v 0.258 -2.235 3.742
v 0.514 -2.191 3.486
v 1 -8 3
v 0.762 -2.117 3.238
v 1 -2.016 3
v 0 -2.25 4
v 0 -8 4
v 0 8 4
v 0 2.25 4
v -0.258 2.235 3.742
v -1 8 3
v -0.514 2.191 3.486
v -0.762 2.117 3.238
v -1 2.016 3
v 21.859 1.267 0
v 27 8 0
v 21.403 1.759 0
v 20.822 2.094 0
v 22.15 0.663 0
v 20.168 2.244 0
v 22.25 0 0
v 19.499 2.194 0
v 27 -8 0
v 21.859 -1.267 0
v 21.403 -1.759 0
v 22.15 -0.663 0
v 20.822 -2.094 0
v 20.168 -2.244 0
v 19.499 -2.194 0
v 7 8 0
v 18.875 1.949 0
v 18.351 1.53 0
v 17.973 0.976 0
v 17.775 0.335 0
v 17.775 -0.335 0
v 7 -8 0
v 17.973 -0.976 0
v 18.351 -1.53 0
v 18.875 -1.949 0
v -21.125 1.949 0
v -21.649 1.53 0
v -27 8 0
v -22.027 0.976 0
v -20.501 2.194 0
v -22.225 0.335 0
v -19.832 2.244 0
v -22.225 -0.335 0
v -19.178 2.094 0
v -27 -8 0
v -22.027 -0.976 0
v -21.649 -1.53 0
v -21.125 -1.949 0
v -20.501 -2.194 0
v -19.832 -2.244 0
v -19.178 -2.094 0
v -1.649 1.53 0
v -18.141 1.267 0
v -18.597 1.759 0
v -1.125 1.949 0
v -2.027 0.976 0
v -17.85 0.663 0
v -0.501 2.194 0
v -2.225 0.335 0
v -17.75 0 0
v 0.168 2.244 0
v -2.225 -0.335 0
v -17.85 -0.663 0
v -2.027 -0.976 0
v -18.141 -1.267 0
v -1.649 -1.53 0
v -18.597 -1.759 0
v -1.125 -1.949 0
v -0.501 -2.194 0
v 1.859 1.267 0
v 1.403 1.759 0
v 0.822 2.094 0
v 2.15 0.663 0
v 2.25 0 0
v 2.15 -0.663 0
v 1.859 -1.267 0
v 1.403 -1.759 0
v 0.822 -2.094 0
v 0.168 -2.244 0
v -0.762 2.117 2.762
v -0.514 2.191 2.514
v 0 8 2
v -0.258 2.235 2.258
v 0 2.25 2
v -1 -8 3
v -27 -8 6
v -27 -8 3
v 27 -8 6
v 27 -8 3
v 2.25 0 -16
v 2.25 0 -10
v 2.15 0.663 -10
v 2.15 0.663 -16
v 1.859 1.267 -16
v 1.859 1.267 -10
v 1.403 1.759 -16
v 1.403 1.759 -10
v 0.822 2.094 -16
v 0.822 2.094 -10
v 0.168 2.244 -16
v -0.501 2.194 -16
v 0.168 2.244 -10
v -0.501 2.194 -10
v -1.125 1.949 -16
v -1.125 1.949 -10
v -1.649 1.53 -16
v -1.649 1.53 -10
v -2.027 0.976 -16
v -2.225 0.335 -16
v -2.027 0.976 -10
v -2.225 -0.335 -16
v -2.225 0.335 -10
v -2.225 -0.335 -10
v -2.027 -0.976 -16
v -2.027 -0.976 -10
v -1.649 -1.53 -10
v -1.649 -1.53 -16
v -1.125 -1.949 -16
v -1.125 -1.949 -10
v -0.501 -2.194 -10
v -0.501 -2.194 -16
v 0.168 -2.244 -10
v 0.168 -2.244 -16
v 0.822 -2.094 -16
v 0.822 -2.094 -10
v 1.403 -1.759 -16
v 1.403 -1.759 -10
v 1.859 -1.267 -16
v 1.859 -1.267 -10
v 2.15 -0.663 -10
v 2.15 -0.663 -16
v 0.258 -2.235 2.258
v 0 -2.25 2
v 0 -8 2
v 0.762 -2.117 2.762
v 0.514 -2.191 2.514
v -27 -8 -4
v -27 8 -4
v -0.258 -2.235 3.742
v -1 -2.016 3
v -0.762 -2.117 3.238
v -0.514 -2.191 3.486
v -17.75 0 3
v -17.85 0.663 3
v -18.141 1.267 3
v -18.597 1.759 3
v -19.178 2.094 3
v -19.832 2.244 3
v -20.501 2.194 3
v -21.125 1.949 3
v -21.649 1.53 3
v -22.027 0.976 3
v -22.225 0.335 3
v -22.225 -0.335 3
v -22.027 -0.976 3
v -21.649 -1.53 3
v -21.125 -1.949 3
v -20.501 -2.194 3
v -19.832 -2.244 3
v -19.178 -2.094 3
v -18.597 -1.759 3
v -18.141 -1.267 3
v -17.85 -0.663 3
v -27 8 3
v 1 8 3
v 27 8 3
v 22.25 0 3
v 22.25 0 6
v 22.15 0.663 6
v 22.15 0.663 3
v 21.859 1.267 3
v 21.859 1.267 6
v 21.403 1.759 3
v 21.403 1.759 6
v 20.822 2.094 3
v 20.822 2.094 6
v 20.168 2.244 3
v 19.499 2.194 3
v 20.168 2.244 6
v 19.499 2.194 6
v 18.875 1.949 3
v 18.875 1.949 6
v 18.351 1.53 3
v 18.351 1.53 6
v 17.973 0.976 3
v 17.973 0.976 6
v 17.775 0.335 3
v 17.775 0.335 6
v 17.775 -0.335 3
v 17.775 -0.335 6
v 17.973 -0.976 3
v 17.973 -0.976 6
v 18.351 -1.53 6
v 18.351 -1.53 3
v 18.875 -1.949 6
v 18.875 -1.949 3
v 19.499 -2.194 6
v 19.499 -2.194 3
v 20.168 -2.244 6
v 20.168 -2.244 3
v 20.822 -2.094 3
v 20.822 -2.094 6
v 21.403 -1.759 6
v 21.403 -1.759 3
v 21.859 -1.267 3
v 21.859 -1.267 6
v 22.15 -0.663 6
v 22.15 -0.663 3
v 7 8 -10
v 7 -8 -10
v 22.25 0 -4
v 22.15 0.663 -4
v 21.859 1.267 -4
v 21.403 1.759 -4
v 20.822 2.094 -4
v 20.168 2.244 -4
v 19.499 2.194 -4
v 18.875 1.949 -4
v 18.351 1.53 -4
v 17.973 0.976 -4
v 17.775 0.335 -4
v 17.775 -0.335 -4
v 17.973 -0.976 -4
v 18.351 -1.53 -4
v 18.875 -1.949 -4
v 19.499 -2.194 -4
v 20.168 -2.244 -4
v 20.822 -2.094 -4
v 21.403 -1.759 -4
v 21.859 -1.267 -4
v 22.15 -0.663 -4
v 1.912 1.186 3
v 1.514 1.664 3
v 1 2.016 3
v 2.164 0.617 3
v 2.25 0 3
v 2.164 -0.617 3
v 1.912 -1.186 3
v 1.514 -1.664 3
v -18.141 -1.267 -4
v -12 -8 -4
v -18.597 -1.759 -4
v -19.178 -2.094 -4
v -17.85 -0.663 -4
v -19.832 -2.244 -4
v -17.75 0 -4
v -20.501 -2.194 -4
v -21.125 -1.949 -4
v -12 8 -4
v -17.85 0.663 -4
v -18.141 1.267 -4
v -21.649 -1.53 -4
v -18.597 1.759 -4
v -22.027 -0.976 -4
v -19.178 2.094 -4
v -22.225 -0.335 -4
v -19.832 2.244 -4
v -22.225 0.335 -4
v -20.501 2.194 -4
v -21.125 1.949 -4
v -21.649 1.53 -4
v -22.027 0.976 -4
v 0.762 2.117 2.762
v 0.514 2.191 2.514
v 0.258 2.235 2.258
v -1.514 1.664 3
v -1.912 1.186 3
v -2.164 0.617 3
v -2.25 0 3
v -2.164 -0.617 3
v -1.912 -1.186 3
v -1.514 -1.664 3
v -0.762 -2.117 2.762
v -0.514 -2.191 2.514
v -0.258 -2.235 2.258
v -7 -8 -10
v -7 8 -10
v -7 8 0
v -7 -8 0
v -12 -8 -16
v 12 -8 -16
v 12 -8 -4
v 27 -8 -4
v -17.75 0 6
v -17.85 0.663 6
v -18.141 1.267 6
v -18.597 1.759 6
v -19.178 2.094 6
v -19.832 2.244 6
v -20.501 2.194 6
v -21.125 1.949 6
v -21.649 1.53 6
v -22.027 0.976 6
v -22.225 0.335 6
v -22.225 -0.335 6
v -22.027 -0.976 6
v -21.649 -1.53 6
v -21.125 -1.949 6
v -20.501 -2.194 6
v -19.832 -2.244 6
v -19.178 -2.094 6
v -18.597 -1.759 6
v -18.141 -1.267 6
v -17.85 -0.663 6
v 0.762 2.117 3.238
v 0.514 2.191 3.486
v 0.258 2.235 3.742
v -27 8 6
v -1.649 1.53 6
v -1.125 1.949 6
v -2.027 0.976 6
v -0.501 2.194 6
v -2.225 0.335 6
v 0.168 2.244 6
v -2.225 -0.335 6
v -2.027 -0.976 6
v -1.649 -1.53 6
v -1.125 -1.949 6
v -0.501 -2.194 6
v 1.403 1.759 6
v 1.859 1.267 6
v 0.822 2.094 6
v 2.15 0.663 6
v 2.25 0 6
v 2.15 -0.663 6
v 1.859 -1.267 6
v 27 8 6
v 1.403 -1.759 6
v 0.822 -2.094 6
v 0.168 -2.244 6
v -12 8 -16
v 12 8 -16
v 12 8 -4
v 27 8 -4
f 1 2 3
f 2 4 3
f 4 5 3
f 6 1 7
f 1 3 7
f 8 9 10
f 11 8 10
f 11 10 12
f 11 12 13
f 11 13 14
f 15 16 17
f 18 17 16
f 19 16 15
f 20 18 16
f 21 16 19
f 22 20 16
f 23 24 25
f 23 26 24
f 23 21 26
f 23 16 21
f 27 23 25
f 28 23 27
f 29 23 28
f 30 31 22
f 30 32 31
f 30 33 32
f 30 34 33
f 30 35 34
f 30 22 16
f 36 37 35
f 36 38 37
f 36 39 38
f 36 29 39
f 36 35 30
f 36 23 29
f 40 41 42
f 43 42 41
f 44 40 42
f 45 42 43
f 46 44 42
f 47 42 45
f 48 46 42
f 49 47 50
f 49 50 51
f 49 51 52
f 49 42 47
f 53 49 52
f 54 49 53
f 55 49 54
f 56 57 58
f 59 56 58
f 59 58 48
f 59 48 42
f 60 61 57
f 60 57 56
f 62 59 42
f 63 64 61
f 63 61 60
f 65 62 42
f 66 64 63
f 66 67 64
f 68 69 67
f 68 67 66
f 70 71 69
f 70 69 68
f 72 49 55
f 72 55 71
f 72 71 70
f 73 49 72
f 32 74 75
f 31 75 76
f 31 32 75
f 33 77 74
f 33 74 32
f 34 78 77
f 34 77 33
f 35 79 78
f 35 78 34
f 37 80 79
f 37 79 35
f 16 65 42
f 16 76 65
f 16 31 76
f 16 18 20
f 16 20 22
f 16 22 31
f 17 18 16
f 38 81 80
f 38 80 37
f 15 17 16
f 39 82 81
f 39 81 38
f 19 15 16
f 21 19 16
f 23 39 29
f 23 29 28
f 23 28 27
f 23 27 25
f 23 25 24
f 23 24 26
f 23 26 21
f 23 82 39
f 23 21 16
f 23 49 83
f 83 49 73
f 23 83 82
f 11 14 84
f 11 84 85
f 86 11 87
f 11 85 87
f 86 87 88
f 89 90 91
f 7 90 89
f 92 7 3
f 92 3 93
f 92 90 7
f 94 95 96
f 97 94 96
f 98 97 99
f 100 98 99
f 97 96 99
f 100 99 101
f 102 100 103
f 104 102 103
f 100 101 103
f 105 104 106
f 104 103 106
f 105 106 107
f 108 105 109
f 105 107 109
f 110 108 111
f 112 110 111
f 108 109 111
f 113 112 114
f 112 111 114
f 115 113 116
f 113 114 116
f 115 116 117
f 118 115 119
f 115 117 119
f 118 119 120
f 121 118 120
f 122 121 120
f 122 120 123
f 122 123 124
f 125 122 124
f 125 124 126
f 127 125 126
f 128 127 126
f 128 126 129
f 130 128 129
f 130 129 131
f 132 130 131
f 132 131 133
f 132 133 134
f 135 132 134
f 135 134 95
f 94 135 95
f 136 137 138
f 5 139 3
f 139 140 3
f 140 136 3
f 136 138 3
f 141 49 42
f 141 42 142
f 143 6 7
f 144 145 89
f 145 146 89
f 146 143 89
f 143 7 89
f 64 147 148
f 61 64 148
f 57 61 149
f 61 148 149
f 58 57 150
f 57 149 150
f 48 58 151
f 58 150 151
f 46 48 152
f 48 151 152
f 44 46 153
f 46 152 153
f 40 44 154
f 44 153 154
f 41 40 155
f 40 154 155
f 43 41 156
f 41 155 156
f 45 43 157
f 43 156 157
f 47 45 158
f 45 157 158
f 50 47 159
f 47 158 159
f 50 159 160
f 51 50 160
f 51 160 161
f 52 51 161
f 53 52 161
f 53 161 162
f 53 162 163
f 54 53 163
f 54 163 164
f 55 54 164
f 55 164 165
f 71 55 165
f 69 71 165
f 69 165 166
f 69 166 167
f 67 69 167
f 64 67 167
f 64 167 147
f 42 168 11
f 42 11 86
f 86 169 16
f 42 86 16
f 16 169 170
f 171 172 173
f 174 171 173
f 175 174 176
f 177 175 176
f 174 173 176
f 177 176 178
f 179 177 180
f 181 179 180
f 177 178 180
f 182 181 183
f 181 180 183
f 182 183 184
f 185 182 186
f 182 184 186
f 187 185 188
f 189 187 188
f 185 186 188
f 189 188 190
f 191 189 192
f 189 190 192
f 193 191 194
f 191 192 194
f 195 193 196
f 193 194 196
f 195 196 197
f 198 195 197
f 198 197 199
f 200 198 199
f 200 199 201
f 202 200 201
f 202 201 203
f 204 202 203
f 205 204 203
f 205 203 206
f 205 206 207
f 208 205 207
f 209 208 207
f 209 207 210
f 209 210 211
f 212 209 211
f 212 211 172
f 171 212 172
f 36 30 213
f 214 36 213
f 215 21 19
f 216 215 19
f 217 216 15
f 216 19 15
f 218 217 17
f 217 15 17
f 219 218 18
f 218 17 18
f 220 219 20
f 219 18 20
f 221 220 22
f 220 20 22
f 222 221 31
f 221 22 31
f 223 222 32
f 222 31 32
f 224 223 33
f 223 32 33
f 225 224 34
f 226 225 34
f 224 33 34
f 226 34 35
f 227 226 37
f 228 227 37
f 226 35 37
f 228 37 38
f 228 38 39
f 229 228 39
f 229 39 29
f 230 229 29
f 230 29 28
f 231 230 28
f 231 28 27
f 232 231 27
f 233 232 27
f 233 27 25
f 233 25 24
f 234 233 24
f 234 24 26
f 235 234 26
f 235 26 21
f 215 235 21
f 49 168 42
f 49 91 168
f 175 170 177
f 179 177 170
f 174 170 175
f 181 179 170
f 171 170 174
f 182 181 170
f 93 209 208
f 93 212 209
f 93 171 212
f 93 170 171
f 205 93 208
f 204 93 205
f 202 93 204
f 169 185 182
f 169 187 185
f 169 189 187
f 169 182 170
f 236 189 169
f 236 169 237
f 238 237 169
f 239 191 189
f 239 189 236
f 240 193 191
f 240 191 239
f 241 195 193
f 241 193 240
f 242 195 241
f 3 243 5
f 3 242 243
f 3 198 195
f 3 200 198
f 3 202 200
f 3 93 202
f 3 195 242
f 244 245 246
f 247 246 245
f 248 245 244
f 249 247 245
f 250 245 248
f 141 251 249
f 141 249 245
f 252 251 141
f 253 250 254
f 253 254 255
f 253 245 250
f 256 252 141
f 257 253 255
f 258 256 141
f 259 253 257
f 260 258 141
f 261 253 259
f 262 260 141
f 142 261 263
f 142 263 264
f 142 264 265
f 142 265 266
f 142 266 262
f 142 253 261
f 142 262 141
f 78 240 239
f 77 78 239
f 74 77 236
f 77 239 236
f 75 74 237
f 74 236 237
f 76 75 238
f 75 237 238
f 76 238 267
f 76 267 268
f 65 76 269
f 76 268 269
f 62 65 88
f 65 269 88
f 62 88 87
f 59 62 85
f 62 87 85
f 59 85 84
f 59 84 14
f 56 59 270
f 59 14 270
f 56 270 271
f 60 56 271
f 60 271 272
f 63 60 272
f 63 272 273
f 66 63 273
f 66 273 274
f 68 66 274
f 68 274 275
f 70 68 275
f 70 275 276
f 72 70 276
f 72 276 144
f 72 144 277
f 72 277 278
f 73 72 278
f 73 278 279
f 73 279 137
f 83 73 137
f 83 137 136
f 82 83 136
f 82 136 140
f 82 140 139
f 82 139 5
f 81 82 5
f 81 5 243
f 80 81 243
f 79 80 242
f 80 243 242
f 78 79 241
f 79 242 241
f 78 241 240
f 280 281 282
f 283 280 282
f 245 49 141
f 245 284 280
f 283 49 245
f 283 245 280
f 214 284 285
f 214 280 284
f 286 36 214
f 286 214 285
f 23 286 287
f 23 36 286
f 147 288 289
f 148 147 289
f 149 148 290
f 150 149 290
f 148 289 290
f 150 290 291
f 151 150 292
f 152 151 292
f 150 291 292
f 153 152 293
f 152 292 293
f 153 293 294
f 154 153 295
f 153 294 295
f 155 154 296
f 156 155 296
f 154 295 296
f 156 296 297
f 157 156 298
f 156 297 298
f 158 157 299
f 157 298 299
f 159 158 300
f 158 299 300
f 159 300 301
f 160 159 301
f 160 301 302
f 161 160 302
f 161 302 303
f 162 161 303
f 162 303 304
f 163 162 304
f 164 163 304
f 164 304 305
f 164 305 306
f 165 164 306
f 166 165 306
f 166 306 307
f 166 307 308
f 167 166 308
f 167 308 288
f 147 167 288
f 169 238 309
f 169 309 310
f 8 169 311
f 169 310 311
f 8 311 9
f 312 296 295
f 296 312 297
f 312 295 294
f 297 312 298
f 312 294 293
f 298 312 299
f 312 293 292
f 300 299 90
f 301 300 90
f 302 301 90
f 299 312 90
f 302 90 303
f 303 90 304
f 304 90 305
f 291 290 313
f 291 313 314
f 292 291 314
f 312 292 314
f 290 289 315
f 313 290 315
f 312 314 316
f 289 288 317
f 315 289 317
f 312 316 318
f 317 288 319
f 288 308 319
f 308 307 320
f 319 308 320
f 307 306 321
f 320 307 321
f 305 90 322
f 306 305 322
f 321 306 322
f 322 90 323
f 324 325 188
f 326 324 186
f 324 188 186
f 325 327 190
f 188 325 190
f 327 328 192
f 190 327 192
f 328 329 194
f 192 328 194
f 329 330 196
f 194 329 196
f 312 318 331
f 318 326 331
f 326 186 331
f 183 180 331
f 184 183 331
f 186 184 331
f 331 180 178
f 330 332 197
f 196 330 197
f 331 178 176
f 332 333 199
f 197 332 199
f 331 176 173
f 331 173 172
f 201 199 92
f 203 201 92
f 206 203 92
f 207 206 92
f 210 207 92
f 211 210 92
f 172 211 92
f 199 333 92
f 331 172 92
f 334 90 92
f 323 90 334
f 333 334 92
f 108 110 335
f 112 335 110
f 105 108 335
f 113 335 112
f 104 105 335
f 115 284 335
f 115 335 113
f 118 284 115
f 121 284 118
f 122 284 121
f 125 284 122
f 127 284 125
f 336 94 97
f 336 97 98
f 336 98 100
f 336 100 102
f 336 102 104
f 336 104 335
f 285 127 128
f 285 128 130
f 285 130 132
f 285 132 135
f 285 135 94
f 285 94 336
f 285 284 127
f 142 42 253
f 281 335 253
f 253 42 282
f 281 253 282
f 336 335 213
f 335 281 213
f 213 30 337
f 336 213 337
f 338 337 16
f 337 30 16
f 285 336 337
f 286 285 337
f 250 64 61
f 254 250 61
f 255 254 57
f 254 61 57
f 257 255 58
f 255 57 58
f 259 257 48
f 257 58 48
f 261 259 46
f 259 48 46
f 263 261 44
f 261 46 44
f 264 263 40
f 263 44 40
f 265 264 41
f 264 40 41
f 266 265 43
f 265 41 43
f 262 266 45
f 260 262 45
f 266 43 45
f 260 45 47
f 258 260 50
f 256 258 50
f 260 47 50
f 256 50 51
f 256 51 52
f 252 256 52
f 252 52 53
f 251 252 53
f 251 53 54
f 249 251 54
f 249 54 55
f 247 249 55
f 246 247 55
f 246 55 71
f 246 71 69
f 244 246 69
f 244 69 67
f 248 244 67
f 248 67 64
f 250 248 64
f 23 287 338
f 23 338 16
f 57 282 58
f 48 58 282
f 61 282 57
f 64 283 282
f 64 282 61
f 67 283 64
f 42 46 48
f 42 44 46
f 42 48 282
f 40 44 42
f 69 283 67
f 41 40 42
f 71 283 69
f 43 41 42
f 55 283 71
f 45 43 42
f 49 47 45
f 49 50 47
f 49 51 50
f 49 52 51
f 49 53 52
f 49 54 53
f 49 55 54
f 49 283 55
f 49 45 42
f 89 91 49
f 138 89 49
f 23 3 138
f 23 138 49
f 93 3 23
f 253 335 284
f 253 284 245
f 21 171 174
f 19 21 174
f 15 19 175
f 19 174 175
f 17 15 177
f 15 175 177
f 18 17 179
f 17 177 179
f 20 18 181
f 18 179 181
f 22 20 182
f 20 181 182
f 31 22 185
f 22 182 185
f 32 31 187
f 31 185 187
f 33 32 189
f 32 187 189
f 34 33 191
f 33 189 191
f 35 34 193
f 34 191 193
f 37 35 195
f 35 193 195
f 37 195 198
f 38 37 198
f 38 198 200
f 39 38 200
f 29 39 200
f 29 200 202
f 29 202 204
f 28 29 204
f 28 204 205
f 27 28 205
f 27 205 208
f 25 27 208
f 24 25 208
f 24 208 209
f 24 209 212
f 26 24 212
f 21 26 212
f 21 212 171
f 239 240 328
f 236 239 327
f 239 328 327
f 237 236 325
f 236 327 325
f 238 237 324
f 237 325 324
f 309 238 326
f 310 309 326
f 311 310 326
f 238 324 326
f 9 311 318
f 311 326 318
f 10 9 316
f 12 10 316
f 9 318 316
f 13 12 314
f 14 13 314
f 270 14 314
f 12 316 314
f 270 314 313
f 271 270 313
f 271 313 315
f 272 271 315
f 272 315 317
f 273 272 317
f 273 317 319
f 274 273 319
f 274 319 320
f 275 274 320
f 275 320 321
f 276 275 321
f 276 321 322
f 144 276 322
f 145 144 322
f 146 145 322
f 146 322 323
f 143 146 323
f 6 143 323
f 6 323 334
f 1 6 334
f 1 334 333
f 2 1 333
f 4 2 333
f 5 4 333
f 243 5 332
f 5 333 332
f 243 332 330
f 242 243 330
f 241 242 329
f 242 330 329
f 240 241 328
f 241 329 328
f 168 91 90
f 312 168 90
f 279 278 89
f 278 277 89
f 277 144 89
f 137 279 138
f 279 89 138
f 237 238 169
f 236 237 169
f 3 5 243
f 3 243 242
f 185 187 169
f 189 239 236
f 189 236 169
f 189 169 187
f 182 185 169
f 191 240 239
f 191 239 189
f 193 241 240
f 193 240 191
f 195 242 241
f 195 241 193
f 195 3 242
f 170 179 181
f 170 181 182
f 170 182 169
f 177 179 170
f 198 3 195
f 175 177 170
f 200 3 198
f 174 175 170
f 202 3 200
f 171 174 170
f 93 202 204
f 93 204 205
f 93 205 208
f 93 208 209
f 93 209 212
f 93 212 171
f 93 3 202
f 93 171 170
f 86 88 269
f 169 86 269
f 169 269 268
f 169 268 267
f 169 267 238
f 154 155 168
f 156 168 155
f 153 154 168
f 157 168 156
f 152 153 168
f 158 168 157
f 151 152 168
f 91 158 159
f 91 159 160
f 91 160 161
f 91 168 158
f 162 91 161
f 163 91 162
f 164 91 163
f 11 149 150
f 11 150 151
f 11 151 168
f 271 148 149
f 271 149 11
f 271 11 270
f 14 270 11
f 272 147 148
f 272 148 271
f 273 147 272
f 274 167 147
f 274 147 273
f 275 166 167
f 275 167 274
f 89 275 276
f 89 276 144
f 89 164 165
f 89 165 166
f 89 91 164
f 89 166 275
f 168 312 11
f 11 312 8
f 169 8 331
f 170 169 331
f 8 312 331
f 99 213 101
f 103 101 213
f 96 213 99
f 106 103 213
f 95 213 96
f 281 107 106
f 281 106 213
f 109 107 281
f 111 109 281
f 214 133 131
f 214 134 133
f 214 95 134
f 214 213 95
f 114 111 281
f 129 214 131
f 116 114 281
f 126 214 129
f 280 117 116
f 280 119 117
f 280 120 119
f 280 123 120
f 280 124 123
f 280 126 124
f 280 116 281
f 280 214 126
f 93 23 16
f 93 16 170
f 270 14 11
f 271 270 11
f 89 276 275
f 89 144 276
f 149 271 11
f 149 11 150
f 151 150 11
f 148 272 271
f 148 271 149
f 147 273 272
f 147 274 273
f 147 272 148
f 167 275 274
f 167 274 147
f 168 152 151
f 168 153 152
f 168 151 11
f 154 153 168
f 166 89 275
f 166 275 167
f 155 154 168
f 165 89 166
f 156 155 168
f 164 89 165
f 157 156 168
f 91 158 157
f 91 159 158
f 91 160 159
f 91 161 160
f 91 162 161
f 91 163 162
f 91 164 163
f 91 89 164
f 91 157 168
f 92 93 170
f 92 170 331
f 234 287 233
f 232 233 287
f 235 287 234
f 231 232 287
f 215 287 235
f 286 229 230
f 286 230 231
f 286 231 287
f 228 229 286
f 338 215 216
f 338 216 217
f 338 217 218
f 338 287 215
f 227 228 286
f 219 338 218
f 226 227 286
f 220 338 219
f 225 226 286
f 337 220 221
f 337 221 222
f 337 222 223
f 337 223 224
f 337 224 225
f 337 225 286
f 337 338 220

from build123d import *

# Parameters (mm, degrees)
F1_DEPTH = 8
F2_DEPTH = 8
F0_W     = 54
F0_H     = 3
F3_DEPTH = 8
F4_R     = 2.25
F5_DEPTH = 30
F7_DEPTH = 16
F8_W     = 15
F8_H     = 12
F9_DEPTH = 25


with BuildPart() as f1:
    # F0 (on Front) → F1 (new body, symmetric)
    with BuildSketch(Plane.XZ):
        Polygon((-7, -10), (-7, 0), (-27, 0), (-27, -16), (27, -16), (27, 0), (7, 0), (7, -10), align=None)
    extrude(amount=F1_DEPTH, both=True)


with BuildPart() as f2:
    # F0 (on Front) → F2 (new body, symmetric)
    with BuildSketch(Plane.XZ):
        Polygon((-27, 0), (-7, 0), (7, 0), (27, 0), (27, 3), (-27, 3), align=None)
    extrude(amount=F2_DEPTH, both=True)


with BuildPart() as f3:
    # F0 (on Front) → F3 (new body, symmetric)
    with BuildSketch(Plane.XZ):
        with Locations((0, 4.5)):
            Rectangle(F0_W, F0_H)
    extrude(amount=F3_DEPTH, both=True)


with BuildPart() as f5_tool:
    # F4 (on face) → F5 (new body)
    with BuildSketch(Plane.XY.offset(6)):
        with Locations((-20, 0)):
            Circle(F4_R)
        with Locations((20, 0)):
            Circle(F4_R)
        Circle(F4_R)
    extrude(amount=-F5_DEPTH)


with BuildPart() as f1_1:
    add(f1.part)

    # F5: cut by f5_tool
    add(f5_tool.part, mode=Mode.SUBTRACT)

    # F8 (on face) → F9 (cut)
    with BuildSketch(Plane(origin=(0, 8, 0), x_dir=(-1, 0, 0), z_dir=(0, 1, 0))):
        with Locations((19.5, -10)):
            Rectangle(F8_W, F8_H)
        with Locations((-19.5, -10)):
            Rectangle(F8_W, F8_H)
    extrude(amount=-F9_DEPTH, mode=Mode.SUBTRACT)


with BuildPart() as f2_1:
    add(f2.part)

    # F5: cut by f5_tool
    add(f5_tool.part, mode=Mode.SUBTRACT)


with BuildPart() as f3_1:
    add(f3.part)

    # F5: cut by f5_tool
    add(f5_tool.part, mode=Mode.SUBTRACT)


with BuildPart() as f7_tool:
    # F6 (on face) → F7 (new body)
    with BuildSketch(Plane.XZ.offset(8)):
        Polygon((0, 4), (-1, 3), (1, 3), align=None)
        Polygon((1, 3), (-1, 3), (0, 2), align=None)
    extrude(amount=-F7_DEPTH)


with BuildPart() as f2_2:
    add(f2_1.part)

    # F7: cut by f7_tool
    add(f7_tool.part, mode=Mode.SUBTRACT)


with BuildPart() as f3_2:
    add(f3_1.part)

    # F7: cut by f7_tool
    add(f7_tool.part, mode=Mode.SUBTRACT)


solid = Compound([f1_1.part, f2_2.part, f3_2.part])
